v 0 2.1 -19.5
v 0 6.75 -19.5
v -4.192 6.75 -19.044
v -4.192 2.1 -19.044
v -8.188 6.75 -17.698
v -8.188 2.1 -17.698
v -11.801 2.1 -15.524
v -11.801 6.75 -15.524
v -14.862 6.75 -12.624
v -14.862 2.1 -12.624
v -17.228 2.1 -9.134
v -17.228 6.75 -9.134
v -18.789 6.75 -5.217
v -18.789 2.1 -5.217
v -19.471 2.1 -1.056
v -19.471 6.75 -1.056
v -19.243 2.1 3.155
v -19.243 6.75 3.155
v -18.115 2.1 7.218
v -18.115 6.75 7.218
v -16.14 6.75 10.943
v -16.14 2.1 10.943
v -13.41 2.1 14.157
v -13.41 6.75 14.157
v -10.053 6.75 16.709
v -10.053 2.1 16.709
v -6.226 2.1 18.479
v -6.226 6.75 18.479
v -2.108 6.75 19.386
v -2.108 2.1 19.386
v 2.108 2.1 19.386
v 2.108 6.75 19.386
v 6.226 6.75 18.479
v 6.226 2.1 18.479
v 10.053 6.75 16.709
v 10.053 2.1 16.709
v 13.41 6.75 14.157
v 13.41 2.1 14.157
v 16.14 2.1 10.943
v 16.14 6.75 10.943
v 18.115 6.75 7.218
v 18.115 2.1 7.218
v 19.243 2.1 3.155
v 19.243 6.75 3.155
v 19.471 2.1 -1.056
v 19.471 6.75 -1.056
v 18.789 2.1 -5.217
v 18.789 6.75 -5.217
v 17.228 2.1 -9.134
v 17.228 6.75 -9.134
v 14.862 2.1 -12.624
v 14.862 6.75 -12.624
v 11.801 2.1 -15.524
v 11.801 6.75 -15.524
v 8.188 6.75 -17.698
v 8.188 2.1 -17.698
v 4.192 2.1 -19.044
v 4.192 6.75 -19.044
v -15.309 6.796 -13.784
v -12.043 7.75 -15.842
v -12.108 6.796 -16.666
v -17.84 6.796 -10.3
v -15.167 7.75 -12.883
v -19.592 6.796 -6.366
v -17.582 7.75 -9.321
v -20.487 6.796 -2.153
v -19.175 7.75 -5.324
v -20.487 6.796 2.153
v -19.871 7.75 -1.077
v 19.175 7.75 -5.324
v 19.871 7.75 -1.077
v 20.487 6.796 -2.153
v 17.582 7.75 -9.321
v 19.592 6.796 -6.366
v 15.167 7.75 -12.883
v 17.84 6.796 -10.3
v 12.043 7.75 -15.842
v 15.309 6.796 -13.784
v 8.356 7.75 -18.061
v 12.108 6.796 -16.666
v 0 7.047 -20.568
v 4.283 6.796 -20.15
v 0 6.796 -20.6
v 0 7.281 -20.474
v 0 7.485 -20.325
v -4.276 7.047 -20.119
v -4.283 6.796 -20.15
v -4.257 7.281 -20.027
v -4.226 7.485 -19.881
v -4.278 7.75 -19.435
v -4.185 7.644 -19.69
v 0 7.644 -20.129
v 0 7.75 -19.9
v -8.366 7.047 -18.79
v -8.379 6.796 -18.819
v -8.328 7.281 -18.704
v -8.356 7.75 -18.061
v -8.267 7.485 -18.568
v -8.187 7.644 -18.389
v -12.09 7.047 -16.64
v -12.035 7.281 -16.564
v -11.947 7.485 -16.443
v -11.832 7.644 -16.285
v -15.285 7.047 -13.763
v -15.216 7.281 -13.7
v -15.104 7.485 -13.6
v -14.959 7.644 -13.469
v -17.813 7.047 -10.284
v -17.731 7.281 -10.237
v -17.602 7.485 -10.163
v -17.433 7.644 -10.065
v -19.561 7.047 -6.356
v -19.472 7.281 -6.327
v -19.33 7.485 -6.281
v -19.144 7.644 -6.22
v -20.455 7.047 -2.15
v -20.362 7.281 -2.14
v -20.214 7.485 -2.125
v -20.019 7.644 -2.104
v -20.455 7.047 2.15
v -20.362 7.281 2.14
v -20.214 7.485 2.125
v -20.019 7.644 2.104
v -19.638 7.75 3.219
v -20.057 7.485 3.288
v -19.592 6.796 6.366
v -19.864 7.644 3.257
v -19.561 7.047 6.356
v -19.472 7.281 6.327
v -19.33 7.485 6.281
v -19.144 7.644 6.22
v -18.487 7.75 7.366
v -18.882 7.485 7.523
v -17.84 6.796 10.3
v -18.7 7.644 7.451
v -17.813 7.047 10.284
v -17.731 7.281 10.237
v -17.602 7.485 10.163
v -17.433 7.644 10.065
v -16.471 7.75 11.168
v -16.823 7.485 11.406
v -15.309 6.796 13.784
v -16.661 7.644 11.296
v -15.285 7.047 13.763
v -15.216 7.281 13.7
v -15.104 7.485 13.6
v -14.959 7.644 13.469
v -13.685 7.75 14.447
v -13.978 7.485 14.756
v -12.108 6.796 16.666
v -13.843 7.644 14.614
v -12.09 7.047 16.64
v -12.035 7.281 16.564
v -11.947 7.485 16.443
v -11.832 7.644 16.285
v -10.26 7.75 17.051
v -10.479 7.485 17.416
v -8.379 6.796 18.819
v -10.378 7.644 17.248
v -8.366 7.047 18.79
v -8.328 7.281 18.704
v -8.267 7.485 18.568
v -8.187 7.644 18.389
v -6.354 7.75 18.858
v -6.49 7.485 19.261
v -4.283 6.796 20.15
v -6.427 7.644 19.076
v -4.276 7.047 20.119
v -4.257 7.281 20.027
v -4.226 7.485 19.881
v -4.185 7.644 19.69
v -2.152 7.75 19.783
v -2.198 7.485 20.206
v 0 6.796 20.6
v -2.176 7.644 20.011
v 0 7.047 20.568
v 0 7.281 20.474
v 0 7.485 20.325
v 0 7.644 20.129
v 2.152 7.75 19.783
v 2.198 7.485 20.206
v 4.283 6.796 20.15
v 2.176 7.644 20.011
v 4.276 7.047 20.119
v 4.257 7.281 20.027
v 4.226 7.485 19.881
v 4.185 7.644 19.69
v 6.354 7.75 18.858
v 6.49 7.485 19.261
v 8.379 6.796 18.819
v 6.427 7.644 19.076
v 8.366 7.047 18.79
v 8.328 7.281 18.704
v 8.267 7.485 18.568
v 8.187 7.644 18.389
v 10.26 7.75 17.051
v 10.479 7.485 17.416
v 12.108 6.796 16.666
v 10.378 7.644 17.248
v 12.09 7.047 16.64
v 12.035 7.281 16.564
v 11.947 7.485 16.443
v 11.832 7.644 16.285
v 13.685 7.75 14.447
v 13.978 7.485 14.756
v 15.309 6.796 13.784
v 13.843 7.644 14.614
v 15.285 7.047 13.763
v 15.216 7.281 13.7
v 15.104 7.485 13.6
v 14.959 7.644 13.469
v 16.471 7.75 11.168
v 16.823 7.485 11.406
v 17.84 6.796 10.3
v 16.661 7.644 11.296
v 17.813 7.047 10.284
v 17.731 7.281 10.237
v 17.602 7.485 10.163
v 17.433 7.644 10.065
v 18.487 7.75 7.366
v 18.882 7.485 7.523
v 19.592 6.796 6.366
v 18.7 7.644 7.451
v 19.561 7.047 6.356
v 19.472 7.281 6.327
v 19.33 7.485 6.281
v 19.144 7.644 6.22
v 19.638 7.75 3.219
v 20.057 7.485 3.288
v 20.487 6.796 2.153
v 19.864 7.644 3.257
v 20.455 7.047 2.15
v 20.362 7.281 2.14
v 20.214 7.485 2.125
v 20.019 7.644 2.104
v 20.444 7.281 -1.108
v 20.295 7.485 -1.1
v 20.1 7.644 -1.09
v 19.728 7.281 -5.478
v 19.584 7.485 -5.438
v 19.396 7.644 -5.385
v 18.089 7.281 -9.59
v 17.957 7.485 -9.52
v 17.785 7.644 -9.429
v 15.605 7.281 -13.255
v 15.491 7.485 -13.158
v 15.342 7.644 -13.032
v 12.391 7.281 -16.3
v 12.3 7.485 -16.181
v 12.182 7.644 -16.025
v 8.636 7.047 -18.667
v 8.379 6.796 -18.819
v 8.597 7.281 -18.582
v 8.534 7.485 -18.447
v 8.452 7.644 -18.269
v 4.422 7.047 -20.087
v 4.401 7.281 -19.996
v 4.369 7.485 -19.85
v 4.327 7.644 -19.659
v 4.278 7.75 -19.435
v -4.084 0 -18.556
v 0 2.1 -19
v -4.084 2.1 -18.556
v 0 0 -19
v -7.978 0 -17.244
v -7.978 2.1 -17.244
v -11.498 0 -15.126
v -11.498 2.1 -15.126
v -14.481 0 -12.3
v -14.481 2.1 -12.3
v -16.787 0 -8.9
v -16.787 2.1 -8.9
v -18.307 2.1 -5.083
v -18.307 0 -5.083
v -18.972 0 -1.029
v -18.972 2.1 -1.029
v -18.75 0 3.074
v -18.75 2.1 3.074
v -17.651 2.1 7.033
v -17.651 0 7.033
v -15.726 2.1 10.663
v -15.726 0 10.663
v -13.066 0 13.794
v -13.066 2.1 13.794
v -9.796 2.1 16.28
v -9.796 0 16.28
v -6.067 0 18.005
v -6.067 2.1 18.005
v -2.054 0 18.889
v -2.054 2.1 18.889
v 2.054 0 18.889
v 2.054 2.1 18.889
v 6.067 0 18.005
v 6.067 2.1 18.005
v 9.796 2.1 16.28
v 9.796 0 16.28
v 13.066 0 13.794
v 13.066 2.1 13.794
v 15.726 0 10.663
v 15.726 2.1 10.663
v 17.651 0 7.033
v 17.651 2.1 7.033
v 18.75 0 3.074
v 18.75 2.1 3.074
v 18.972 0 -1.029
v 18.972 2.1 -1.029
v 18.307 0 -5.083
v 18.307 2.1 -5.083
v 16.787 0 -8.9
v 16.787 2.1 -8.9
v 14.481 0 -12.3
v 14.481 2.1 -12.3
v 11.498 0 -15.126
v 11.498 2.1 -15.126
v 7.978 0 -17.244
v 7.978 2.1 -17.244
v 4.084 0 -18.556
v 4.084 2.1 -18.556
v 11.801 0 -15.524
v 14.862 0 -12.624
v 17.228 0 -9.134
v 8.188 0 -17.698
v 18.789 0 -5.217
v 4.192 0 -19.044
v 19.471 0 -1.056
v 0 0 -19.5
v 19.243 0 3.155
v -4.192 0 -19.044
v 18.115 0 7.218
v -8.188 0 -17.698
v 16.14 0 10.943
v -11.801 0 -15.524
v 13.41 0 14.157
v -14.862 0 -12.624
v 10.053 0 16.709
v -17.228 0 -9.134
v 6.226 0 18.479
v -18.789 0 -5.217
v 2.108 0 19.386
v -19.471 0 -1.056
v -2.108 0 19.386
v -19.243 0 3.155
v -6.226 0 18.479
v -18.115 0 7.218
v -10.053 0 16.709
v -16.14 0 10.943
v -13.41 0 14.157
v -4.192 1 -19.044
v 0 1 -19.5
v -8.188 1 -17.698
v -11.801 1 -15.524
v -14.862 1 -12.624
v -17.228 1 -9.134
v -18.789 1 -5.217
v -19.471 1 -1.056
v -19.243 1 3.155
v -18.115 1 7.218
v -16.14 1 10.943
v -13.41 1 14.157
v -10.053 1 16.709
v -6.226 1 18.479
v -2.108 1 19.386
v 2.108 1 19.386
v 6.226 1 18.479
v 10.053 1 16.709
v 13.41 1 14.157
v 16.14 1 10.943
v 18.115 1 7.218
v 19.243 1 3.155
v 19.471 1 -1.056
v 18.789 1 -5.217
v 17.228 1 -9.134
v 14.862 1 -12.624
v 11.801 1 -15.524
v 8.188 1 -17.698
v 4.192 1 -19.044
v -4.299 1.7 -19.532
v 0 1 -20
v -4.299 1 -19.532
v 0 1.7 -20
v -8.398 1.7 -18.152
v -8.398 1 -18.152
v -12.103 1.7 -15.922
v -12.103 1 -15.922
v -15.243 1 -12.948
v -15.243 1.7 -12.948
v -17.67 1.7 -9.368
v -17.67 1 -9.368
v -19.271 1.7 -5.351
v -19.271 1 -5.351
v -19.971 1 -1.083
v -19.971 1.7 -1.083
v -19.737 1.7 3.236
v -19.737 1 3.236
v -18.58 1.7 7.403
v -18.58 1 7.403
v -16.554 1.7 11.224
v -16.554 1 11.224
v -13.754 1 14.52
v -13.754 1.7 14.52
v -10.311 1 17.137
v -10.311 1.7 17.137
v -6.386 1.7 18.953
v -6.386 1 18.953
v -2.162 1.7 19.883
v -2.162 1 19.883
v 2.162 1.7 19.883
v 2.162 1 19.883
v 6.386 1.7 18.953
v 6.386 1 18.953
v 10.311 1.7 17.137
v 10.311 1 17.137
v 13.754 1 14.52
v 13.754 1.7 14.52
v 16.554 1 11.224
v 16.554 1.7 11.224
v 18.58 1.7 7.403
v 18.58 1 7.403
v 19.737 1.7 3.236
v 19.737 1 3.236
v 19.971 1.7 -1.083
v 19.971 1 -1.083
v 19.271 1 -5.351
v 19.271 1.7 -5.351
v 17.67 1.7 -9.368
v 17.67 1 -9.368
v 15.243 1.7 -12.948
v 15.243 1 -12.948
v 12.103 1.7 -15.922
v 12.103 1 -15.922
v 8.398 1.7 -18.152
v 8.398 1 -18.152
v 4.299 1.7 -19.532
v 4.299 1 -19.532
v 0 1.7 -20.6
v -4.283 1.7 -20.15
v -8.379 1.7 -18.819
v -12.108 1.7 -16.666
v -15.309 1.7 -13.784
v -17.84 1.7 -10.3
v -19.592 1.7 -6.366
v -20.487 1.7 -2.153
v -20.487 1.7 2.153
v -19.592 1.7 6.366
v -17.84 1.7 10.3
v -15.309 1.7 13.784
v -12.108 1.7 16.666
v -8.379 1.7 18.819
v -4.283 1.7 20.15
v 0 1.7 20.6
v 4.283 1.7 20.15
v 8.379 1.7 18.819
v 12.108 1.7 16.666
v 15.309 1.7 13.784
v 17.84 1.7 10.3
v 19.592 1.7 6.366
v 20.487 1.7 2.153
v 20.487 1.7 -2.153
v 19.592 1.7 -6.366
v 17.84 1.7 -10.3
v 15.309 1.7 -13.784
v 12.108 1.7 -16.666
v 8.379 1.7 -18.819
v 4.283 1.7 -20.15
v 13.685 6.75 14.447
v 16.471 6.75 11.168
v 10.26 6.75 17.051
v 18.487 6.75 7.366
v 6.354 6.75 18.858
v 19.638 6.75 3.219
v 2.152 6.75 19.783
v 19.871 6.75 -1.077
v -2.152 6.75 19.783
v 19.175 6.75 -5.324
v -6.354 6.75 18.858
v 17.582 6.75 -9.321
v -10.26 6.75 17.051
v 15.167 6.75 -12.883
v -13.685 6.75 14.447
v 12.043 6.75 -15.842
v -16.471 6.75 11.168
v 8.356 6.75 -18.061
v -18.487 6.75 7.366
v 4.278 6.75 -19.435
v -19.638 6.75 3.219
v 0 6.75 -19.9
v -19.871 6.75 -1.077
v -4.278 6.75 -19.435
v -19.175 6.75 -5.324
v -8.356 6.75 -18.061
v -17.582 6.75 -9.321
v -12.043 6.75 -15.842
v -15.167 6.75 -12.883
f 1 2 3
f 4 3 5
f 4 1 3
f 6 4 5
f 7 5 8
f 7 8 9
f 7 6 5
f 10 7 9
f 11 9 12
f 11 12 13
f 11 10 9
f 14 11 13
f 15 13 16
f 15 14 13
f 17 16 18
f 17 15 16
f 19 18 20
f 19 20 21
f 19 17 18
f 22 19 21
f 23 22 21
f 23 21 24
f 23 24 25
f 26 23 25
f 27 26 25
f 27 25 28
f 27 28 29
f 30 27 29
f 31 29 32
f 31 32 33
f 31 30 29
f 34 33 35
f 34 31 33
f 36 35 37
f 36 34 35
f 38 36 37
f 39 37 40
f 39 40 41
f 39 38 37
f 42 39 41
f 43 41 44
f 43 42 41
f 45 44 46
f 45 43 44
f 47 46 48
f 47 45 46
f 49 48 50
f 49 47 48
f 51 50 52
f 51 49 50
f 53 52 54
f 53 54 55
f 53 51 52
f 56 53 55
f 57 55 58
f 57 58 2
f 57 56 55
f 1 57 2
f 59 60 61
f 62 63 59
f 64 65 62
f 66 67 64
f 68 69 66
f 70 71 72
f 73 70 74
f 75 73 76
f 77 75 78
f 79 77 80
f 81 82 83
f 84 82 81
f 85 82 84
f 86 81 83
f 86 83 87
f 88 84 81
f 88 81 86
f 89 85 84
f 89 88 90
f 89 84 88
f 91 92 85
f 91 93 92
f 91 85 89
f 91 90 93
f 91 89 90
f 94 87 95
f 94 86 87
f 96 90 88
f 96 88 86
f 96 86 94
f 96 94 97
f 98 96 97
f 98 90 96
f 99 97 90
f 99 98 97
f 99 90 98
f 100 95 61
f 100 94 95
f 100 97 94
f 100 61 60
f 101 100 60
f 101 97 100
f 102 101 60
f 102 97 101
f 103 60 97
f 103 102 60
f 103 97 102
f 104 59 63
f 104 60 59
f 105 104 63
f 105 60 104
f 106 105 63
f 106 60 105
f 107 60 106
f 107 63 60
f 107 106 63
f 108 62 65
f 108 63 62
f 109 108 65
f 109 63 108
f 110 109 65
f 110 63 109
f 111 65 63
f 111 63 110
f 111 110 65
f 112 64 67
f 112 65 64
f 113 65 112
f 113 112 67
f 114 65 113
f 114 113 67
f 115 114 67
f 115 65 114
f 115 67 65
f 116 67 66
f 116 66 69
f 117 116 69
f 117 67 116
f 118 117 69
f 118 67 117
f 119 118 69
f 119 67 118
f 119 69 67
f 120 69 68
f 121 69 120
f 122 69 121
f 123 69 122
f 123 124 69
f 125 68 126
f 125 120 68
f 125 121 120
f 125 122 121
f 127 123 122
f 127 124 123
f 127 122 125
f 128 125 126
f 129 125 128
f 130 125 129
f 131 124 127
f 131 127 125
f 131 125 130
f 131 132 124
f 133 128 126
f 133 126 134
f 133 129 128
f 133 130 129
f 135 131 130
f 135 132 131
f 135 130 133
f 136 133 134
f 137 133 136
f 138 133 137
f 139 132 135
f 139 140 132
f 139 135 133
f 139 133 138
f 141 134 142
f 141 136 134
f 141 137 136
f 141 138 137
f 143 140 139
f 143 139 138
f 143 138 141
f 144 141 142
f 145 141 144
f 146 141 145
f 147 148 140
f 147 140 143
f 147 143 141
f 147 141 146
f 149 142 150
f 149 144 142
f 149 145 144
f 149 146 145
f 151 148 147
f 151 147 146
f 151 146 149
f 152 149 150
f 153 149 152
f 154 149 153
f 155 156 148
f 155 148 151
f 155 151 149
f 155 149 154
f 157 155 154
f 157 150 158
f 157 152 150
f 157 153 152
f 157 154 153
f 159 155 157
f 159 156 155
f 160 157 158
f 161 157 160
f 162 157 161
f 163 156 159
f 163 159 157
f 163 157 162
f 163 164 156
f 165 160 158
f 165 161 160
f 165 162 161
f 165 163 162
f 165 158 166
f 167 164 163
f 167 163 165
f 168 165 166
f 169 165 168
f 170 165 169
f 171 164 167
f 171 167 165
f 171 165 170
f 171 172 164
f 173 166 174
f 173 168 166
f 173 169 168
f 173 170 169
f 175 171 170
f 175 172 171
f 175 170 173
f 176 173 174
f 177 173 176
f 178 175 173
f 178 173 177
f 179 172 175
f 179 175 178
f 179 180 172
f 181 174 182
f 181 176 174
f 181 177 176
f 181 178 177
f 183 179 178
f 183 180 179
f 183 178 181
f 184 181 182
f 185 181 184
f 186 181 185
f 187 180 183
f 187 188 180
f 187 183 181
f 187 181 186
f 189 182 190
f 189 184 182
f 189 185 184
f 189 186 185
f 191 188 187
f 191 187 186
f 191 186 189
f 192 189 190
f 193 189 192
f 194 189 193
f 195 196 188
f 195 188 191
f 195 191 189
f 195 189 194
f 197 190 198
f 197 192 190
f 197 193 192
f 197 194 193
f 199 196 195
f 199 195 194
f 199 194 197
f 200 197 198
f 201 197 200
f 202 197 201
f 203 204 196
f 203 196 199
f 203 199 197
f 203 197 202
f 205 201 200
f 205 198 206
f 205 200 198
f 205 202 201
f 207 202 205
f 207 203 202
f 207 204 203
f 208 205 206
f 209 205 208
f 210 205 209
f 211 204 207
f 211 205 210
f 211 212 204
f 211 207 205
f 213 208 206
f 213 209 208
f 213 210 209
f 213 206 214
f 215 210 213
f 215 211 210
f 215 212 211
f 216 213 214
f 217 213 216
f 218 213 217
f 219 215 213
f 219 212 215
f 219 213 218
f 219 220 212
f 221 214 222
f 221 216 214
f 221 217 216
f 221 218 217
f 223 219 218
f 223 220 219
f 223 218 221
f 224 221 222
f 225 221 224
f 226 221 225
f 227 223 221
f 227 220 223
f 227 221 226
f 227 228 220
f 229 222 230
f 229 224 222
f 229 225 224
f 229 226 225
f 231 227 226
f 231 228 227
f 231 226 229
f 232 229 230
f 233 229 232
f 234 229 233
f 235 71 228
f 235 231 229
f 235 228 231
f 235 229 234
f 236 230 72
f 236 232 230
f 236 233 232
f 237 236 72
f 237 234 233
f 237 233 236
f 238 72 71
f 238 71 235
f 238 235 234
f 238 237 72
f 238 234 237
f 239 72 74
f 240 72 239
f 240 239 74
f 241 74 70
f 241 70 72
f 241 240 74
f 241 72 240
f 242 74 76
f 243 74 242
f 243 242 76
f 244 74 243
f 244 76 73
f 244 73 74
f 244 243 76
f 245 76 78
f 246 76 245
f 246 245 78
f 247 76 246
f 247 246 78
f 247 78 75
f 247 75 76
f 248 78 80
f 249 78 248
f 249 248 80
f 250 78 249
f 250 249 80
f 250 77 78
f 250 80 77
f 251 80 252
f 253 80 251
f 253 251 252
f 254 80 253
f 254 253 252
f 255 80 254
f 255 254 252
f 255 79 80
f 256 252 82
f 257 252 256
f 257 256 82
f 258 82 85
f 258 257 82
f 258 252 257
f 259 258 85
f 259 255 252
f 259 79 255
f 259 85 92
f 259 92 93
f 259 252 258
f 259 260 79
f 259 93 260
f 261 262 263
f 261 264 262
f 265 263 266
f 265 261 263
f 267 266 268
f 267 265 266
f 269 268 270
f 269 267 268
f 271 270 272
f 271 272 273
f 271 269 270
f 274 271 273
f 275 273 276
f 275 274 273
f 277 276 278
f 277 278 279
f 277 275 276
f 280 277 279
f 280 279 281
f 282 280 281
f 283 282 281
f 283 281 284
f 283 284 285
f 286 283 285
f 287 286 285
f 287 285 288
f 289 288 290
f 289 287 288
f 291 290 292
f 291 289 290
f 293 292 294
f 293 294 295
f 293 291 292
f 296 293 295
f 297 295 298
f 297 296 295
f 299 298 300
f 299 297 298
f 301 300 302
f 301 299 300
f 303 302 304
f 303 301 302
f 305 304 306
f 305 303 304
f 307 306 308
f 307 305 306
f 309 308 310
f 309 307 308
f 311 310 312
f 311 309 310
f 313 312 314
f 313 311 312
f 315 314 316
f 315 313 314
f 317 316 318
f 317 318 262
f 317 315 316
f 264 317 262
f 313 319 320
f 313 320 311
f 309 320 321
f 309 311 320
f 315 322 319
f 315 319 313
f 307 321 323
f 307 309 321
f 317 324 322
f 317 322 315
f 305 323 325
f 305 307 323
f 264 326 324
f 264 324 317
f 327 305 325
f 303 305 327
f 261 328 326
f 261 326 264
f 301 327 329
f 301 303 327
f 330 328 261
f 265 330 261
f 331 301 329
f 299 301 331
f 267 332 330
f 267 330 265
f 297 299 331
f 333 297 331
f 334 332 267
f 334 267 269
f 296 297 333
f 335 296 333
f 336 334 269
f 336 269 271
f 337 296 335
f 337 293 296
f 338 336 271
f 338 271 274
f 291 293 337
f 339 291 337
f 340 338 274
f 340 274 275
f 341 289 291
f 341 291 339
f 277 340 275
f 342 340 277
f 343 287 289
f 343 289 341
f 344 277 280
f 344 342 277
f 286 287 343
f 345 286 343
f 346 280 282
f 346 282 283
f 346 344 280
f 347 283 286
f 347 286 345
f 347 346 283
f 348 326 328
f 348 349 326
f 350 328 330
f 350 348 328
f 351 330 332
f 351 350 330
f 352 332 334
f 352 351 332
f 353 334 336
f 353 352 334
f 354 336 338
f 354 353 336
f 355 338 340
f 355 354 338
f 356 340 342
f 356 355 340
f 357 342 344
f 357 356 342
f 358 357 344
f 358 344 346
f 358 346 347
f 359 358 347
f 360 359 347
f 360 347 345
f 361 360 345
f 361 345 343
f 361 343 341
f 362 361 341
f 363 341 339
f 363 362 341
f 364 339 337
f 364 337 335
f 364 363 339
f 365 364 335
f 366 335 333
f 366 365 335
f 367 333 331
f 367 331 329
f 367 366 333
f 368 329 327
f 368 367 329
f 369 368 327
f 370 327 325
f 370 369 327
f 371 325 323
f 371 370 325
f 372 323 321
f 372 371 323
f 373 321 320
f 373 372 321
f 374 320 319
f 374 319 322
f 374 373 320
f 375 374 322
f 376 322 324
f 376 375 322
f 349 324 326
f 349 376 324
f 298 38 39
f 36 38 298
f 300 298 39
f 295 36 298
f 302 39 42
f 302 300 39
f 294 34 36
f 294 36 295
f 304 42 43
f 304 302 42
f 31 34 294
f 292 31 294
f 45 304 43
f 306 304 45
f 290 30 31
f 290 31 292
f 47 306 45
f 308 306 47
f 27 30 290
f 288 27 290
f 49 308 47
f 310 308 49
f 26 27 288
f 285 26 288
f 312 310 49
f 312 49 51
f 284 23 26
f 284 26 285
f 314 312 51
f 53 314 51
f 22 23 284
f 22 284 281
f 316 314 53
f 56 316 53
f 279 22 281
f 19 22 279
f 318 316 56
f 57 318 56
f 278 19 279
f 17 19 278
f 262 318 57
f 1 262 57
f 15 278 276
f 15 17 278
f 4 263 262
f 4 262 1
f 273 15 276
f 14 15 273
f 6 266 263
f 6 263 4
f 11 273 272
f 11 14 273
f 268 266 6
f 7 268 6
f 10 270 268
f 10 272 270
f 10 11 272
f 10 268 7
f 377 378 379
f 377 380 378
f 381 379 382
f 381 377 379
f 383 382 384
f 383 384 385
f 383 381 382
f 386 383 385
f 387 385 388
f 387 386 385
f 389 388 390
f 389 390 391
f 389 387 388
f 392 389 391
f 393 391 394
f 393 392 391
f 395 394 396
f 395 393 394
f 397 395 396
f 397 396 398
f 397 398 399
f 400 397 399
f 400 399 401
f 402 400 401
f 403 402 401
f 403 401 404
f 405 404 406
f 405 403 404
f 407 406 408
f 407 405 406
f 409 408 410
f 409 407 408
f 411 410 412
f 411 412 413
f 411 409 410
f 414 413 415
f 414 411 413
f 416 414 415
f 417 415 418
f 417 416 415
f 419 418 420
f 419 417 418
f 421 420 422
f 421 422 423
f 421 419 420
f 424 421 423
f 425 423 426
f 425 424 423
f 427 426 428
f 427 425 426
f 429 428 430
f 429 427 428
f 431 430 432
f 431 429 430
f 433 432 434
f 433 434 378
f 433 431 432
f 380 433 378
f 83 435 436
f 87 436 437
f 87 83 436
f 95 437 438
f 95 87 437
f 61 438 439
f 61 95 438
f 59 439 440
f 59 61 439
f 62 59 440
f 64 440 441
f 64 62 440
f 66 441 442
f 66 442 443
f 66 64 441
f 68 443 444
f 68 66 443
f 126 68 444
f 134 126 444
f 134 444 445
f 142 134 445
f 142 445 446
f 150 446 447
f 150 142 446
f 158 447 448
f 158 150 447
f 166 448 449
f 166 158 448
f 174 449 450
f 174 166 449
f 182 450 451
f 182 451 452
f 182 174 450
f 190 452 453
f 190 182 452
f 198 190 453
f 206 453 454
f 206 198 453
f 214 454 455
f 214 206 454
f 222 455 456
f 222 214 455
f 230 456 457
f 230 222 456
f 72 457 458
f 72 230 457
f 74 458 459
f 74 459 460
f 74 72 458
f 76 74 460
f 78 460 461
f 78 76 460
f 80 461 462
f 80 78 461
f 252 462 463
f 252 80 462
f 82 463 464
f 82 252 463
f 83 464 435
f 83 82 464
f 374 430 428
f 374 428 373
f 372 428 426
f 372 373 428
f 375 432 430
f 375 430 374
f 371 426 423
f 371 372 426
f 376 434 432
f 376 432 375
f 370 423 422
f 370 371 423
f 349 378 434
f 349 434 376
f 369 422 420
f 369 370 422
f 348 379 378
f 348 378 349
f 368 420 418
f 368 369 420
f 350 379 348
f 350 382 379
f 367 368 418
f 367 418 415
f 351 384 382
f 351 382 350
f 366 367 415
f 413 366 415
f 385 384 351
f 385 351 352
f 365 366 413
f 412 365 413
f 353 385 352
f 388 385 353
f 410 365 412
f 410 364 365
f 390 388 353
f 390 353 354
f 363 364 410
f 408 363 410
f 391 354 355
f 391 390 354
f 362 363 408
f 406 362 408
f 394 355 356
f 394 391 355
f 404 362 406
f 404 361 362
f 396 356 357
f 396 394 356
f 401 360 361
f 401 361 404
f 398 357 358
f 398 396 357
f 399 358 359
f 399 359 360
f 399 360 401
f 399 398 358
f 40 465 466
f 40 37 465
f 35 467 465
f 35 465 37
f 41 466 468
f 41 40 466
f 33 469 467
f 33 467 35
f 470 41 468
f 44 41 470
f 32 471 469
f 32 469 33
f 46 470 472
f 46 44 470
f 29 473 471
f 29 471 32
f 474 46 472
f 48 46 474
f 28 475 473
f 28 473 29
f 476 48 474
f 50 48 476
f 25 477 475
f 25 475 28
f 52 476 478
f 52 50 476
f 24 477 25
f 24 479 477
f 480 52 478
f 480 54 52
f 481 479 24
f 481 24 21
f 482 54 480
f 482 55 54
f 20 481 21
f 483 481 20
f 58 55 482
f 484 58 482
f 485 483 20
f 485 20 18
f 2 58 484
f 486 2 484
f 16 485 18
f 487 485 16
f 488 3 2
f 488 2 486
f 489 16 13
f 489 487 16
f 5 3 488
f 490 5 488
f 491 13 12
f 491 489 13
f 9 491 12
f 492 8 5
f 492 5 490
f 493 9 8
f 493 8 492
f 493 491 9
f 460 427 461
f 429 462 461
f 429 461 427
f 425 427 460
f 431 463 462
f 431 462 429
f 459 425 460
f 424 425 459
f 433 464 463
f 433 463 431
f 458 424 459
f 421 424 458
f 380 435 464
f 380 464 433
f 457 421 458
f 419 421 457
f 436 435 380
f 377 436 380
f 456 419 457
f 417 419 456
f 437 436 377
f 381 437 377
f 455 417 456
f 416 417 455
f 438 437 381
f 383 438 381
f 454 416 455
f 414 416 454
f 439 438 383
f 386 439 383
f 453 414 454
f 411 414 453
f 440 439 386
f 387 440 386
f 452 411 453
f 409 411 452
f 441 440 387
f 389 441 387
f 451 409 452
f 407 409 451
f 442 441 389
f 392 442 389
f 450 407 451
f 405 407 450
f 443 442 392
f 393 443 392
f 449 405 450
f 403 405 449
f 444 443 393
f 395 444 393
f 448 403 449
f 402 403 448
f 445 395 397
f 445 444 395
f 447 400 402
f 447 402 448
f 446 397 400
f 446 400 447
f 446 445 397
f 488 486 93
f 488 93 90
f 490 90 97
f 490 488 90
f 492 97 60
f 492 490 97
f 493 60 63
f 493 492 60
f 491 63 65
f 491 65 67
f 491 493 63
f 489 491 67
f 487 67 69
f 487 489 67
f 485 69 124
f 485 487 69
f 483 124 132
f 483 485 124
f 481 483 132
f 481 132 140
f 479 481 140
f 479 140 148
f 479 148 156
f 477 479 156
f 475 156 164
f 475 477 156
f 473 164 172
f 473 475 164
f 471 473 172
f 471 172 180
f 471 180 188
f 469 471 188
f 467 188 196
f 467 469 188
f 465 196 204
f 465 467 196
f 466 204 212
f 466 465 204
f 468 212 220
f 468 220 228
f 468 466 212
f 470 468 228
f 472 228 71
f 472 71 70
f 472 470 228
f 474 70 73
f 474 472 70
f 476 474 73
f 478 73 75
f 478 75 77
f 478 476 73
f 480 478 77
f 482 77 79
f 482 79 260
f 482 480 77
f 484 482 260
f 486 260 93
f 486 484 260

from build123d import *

# Parameters (mm, degrees)
CONG_1_R = 1


with BuildPart() as part:
    # Esquisse1 → Révolution1 (revolve)
    with BuildSketch(Plane.XY, mode=Mode.PRIVATE) as r_volution1_sk:
        Polygon((19, 2.1), (19, 0), (19.5, 0), (19.5, 1), (20, 1), (20, 1.7), (20.6, 1.7), (20.6, 7.75), (19.9, 7.75), (19.9, 6.75), (19.5, 6.75), (19.5, 2.1), align=None)
    revolve(r_volution1_sk.sketch.rotate(Axis((0, 0, 0), (0, 1, 0)), 90), axis=Axis((0, 0, 0), (0, 1, 0)))

    # Congé1
    # the kernel refuses this fillet: 1 mm, written as the material it takes off along each edge
    with BuildSketch(Plane(origin=(0, 7.75, 0), x_dir=(0, 0, -1), z_dir=(1, 0, 0))) as cong_1_piece_1:
        with BuildLine():
            CenterArc((19.6, -0.953939201), CONG_1_R, 0, 72.542396876)
            Line((19.9, 0), (19.906, 0.019078784))
            ThreePointArc((19.906, 0.019078784), (20.25, 0.02), (20.6, 0.02))
            Line((20.6, 0.02), (20.62, 0))
            Line((20.62, 0), (20.62, -0.953939201))
            Line((20.62, -0.953939201), (20.6, -0.953939201))
        make_face()
    revolve(axis=Axis((0, 7.75, 0), (0, 1, 0)), mode=Mode.SUBTRACT)


solid = part.part
